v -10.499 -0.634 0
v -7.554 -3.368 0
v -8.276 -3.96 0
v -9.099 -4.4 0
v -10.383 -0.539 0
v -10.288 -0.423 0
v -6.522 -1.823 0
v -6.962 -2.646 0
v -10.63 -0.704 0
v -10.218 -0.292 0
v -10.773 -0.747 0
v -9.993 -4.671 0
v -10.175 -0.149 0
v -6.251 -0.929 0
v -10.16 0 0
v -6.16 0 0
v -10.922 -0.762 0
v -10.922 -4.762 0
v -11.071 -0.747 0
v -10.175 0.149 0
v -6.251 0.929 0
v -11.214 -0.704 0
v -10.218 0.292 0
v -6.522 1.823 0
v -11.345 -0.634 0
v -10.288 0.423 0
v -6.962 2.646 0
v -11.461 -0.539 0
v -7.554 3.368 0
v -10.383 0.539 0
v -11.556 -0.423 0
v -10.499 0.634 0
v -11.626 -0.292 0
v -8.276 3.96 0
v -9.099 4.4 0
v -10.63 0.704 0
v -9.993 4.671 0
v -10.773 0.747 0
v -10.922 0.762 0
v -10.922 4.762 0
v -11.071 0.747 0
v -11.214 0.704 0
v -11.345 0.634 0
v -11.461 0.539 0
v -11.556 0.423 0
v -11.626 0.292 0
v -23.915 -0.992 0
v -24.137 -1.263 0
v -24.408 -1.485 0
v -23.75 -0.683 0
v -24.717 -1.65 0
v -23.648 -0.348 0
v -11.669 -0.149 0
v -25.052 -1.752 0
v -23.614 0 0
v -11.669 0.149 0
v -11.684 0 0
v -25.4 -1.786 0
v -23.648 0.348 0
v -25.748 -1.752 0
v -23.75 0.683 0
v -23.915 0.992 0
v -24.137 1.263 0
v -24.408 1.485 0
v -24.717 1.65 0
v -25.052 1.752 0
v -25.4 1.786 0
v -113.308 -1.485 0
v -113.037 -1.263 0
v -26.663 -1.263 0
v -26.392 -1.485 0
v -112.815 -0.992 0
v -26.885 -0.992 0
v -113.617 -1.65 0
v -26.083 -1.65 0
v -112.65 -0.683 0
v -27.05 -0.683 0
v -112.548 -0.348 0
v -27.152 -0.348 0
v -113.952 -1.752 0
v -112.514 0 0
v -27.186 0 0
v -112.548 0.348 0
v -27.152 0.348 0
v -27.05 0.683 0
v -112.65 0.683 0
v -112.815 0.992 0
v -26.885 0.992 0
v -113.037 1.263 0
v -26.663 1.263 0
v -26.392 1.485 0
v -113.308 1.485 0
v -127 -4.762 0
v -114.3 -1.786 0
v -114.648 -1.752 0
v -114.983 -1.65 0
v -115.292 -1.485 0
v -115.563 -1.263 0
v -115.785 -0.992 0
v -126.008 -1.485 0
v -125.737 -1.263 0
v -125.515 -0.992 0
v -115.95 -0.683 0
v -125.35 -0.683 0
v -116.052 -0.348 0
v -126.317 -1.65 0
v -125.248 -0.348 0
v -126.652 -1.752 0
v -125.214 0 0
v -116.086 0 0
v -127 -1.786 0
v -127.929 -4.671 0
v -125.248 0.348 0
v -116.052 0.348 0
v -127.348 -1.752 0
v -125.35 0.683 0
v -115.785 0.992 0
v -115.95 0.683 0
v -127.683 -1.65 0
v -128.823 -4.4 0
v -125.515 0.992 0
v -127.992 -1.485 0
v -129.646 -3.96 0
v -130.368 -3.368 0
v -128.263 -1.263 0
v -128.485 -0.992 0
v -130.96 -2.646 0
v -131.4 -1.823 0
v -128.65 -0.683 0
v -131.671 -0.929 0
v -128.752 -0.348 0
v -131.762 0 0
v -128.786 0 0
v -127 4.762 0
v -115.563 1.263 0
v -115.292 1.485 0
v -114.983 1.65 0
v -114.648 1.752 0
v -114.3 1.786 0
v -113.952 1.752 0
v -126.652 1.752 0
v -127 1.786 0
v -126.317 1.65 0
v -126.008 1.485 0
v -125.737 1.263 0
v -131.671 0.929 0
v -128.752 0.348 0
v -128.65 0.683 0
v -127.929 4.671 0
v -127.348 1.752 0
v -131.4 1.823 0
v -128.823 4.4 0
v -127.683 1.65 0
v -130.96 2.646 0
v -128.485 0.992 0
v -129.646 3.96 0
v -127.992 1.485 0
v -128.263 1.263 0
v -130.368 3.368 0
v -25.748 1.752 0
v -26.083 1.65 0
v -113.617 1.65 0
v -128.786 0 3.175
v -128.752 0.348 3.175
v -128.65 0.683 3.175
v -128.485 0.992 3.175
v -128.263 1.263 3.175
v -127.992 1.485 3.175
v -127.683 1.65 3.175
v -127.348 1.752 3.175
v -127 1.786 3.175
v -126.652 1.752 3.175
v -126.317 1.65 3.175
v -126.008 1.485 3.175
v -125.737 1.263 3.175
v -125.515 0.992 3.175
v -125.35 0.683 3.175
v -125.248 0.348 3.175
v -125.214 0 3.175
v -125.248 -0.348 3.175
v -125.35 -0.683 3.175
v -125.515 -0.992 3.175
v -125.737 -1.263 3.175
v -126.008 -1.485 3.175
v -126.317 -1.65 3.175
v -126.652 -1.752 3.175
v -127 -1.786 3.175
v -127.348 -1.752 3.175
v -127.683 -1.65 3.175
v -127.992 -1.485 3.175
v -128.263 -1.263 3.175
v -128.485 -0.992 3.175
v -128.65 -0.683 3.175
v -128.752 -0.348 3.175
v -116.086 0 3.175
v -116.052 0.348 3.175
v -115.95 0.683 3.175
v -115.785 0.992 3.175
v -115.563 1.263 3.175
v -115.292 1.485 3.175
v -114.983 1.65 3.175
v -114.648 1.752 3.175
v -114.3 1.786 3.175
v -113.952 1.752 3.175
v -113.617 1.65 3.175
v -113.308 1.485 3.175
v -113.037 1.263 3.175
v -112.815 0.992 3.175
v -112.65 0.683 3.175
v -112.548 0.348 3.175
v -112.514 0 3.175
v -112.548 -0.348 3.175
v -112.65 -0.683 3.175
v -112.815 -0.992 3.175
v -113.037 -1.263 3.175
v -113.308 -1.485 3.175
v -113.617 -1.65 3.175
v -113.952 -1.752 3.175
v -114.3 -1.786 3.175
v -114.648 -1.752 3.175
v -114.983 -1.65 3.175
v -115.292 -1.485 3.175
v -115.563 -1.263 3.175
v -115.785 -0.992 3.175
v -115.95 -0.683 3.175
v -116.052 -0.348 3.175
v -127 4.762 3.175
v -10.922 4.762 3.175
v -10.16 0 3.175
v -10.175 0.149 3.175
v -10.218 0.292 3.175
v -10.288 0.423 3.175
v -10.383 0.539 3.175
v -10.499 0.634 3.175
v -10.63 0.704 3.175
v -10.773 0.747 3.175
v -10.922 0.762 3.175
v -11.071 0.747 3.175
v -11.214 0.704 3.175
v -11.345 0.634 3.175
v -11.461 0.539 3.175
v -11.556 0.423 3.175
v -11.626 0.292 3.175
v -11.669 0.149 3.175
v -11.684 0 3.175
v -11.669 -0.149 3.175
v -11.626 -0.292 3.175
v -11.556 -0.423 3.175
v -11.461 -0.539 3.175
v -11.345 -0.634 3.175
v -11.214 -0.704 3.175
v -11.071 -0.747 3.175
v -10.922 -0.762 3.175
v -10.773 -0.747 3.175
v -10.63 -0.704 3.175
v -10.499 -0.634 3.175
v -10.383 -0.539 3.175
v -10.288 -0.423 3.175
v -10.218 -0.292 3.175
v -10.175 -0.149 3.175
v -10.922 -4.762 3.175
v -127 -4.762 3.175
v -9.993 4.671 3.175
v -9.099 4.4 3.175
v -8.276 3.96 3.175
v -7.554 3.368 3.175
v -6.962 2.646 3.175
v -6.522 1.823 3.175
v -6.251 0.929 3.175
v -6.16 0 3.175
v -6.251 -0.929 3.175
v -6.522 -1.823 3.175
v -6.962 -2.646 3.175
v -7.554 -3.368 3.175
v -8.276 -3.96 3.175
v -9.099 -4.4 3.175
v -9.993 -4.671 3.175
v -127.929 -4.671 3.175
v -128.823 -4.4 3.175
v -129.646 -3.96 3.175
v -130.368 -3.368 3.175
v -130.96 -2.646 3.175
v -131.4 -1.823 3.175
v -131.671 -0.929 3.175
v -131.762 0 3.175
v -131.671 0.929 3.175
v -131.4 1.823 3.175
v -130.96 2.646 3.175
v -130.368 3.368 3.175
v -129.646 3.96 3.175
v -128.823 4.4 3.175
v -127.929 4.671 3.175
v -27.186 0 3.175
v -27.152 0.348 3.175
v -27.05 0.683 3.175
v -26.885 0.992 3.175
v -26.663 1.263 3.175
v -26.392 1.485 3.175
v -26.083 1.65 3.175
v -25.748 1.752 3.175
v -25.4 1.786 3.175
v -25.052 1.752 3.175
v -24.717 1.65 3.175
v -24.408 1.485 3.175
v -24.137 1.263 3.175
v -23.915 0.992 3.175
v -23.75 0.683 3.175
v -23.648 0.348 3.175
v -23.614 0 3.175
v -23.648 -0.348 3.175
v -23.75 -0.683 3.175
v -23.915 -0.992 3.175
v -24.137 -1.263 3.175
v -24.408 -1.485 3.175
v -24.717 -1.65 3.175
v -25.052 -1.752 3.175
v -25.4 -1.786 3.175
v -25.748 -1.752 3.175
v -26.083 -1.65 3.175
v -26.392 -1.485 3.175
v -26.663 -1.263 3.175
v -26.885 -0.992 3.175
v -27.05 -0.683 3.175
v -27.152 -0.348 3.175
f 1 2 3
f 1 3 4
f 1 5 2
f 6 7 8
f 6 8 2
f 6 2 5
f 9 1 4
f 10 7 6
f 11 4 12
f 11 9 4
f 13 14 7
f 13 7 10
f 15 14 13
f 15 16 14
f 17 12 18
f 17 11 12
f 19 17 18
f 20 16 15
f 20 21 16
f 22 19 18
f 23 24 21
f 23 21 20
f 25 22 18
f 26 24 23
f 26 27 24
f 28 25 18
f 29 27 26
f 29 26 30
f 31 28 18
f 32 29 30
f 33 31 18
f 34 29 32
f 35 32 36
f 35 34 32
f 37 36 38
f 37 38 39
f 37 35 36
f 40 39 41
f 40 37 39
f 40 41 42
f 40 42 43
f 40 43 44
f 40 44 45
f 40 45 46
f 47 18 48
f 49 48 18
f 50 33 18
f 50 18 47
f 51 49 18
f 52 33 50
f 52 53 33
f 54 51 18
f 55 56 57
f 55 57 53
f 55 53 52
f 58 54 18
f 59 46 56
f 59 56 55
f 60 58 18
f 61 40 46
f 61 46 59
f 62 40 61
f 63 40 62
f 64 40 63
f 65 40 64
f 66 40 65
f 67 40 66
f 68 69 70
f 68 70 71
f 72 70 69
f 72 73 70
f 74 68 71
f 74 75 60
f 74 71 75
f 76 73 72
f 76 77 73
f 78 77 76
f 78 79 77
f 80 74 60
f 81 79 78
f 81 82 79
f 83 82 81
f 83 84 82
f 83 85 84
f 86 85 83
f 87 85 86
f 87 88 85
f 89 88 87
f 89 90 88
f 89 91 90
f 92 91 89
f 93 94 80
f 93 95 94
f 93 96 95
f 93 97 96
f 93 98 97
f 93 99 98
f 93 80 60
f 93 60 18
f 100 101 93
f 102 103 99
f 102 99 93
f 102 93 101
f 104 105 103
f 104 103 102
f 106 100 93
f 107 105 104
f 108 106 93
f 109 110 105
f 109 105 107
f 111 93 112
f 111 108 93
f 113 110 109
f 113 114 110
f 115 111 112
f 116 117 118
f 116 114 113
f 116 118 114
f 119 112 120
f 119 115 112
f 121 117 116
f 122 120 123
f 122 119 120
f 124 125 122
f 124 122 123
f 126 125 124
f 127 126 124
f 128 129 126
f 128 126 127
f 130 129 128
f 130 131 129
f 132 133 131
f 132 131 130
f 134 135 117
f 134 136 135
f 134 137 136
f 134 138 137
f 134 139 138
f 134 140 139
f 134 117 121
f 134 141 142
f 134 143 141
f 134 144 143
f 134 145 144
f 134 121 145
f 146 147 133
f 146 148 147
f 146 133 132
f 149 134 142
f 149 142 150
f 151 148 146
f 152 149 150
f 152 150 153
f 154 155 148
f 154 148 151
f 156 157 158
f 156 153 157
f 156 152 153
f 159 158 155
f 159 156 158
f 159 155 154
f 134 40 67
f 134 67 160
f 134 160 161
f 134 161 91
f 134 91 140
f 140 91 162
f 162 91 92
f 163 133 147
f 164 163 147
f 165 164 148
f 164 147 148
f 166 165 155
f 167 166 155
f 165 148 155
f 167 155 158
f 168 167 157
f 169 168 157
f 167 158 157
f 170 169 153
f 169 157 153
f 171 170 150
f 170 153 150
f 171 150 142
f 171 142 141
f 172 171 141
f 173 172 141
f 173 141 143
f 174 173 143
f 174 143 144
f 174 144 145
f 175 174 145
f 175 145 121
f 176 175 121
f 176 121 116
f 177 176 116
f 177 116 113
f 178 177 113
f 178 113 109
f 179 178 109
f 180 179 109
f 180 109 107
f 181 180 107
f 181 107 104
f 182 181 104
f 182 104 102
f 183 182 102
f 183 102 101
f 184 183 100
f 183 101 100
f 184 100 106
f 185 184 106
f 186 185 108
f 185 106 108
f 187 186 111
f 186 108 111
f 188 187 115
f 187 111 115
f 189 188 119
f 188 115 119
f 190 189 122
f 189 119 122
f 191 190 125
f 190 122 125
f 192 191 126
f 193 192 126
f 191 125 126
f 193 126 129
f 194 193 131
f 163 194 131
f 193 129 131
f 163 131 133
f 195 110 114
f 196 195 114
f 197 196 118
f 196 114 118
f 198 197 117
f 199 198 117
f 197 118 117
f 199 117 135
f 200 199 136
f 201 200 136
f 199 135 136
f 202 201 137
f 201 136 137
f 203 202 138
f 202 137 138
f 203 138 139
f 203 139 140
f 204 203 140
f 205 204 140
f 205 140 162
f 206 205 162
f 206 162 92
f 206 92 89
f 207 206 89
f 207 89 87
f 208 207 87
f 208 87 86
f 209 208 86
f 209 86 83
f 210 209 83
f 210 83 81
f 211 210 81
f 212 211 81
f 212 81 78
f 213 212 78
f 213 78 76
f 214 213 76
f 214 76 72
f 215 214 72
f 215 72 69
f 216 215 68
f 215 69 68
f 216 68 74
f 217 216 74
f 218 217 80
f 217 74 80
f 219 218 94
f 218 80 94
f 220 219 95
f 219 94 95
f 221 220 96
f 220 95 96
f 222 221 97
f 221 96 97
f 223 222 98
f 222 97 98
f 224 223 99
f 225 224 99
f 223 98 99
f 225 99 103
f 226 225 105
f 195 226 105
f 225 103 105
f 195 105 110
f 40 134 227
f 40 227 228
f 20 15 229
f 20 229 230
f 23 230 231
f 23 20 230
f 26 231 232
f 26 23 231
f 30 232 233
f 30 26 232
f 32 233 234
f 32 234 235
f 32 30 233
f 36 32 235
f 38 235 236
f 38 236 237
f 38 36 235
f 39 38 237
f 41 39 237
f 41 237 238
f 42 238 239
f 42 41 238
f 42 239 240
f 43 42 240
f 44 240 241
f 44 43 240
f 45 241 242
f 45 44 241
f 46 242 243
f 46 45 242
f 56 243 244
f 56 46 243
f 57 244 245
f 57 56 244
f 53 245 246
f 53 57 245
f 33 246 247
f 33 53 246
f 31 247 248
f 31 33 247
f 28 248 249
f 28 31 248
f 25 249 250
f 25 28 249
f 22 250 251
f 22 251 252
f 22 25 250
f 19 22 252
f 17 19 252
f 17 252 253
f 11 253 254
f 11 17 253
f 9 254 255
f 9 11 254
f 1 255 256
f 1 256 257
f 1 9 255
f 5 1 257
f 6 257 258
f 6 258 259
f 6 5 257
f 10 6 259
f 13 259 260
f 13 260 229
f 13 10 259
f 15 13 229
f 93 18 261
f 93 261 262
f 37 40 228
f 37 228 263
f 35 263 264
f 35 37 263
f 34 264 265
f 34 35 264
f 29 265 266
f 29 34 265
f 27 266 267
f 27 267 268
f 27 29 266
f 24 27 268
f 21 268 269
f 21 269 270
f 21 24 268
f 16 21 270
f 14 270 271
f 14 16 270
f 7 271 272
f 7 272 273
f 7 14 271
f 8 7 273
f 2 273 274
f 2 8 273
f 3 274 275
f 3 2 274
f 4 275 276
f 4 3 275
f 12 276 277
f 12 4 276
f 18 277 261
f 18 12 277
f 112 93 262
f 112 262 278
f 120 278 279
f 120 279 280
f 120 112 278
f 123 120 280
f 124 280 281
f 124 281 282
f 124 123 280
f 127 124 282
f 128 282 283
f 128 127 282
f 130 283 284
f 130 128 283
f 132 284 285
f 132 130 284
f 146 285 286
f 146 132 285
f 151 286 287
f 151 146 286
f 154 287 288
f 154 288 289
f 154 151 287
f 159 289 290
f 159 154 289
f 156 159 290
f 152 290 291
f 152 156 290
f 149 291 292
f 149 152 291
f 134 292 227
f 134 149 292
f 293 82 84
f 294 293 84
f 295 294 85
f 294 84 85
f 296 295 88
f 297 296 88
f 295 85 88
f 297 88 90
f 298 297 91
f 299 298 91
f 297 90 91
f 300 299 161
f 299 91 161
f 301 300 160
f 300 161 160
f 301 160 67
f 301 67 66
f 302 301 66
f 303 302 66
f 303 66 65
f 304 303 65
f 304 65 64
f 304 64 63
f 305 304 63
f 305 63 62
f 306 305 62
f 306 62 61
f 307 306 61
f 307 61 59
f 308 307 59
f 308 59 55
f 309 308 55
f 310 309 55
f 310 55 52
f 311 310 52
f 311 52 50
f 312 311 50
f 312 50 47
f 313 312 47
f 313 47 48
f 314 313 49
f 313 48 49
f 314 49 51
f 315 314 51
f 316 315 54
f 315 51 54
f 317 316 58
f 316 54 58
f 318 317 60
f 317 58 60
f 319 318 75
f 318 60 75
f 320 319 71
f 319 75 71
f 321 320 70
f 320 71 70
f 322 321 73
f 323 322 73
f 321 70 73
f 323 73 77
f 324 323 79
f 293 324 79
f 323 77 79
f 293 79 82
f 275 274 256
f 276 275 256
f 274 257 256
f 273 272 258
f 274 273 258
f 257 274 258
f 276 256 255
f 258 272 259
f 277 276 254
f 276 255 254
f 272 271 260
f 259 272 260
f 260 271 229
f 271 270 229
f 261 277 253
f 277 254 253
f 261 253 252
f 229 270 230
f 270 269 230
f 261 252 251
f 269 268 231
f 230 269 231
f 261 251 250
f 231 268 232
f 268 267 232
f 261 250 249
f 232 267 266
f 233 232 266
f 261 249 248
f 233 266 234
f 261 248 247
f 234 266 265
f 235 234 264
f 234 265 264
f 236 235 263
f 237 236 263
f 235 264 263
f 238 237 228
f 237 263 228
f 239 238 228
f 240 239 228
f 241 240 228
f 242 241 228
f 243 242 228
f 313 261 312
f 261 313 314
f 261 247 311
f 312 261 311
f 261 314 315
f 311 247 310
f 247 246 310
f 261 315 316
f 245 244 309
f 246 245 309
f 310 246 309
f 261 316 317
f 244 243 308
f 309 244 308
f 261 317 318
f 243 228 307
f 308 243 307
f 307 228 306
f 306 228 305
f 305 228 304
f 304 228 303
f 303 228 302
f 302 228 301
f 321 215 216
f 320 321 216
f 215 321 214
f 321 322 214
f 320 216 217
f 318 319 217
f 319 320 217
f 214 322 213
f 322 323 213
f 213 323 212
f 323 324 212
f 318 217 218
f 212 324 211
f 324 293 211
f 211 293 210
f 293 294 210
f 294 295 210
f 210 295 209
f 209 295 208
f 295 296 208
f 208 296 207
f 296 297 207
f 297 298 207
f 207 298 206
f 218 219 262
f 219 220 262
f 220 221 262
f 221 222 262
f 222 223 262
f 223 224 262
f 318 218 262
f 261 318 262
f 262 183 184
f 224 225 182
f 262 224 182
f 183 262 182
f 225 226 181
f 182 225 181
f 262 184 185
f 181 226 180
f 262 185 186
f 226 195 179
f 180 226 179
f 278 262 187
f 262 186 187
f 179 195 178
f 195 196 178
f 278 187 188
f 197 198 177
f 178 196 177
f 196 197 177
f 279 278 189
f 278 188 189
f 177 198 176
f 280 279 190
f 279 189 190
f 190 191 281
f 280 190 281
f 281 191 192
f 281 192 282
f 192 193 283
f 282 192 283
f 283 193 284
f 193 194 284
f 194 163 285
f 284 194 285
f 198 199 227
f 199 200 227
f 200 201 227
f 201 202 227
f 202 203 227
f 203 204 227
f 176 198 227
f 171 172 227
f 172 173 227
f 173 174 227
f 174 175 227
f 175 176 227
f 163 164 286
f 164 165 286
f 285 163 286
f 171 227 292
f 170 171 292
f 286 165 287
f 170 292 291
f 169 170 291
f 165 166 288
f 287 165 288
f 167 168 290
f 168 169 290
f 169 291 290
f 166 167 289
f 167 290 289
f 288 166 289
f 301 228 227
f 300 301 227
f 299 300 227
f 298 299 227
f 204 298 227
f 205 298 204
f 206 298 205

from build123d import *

# Parameters (mm, degrees)
SKETCH1_R                       = 0.762
BOSS_EXTRUDE1_DEPTH             = 3.175
F_9_64_0_14063_DIAMETER_HOLE1_D = 3.572002
F_9_64_0_14063_DIAMETER_HOLE2_D = 3.572002
F_9_64_0_14063_DIAMETER_HOLE3_D = 3.572002


with BuildPart() as part:
    # Sketch1 → Boss-Extrude1 (new body)
    with BuildSketch(Plane.XY):
        with BuildLine():
            Line((-10.922, -4.7625), (-127, -4.7625))
            ThreePointArc((-127, -4.7625), (-131.7625, 0), (-127, 4.7625))
            Line((-127, 4.7625), (-25.4, 4.7625))
            Line((-25.4, 4.7625), (-10.922, 4.7625))
            ThreePointArc((-10.922, 4.7625), (-6.1595, 0), (-10.922, -4.7625))
        make_face()
        with Locations((-25.4, 0)):
            Circle(SKETCH1_R, mode=Mode.SUBTRACT)
        with Locations((-10.922, 0)):
            Circle(SKETCH1_R, mode=Mode.SUBTRACT)
    extrude(amount=BOSS_EXTRUDE1_DEPTH)

    # 9/64 (0.14063) Diameter Hole1 (through all)
    with Locations(Plane.XY.offset(3.175)):
        with Locations((0, 0), (-127, 0)):
            Hole(F_9_64_0_14063_DIAMETER_HOLE1_D / 2)

    # 9/64 (0.14063) Diameter Hole2 (through all)
    with Locations(Plane.XY.offset(3.175)):
        with Locations((-114.3, 0)):
            Hole(F_9_64_0_14063_DIAMETER_HOLE2_D / 2)

    # 9/64 (0.14063) Diameter Hole3 (through all)
    with Locations(Plane.XY.offset(3.175)):
        with Locations((-25.4, 0)):
            Hole(F_9_64_0_14063_DIAMETER_HOLE3_D / 2)


solid = part.part
